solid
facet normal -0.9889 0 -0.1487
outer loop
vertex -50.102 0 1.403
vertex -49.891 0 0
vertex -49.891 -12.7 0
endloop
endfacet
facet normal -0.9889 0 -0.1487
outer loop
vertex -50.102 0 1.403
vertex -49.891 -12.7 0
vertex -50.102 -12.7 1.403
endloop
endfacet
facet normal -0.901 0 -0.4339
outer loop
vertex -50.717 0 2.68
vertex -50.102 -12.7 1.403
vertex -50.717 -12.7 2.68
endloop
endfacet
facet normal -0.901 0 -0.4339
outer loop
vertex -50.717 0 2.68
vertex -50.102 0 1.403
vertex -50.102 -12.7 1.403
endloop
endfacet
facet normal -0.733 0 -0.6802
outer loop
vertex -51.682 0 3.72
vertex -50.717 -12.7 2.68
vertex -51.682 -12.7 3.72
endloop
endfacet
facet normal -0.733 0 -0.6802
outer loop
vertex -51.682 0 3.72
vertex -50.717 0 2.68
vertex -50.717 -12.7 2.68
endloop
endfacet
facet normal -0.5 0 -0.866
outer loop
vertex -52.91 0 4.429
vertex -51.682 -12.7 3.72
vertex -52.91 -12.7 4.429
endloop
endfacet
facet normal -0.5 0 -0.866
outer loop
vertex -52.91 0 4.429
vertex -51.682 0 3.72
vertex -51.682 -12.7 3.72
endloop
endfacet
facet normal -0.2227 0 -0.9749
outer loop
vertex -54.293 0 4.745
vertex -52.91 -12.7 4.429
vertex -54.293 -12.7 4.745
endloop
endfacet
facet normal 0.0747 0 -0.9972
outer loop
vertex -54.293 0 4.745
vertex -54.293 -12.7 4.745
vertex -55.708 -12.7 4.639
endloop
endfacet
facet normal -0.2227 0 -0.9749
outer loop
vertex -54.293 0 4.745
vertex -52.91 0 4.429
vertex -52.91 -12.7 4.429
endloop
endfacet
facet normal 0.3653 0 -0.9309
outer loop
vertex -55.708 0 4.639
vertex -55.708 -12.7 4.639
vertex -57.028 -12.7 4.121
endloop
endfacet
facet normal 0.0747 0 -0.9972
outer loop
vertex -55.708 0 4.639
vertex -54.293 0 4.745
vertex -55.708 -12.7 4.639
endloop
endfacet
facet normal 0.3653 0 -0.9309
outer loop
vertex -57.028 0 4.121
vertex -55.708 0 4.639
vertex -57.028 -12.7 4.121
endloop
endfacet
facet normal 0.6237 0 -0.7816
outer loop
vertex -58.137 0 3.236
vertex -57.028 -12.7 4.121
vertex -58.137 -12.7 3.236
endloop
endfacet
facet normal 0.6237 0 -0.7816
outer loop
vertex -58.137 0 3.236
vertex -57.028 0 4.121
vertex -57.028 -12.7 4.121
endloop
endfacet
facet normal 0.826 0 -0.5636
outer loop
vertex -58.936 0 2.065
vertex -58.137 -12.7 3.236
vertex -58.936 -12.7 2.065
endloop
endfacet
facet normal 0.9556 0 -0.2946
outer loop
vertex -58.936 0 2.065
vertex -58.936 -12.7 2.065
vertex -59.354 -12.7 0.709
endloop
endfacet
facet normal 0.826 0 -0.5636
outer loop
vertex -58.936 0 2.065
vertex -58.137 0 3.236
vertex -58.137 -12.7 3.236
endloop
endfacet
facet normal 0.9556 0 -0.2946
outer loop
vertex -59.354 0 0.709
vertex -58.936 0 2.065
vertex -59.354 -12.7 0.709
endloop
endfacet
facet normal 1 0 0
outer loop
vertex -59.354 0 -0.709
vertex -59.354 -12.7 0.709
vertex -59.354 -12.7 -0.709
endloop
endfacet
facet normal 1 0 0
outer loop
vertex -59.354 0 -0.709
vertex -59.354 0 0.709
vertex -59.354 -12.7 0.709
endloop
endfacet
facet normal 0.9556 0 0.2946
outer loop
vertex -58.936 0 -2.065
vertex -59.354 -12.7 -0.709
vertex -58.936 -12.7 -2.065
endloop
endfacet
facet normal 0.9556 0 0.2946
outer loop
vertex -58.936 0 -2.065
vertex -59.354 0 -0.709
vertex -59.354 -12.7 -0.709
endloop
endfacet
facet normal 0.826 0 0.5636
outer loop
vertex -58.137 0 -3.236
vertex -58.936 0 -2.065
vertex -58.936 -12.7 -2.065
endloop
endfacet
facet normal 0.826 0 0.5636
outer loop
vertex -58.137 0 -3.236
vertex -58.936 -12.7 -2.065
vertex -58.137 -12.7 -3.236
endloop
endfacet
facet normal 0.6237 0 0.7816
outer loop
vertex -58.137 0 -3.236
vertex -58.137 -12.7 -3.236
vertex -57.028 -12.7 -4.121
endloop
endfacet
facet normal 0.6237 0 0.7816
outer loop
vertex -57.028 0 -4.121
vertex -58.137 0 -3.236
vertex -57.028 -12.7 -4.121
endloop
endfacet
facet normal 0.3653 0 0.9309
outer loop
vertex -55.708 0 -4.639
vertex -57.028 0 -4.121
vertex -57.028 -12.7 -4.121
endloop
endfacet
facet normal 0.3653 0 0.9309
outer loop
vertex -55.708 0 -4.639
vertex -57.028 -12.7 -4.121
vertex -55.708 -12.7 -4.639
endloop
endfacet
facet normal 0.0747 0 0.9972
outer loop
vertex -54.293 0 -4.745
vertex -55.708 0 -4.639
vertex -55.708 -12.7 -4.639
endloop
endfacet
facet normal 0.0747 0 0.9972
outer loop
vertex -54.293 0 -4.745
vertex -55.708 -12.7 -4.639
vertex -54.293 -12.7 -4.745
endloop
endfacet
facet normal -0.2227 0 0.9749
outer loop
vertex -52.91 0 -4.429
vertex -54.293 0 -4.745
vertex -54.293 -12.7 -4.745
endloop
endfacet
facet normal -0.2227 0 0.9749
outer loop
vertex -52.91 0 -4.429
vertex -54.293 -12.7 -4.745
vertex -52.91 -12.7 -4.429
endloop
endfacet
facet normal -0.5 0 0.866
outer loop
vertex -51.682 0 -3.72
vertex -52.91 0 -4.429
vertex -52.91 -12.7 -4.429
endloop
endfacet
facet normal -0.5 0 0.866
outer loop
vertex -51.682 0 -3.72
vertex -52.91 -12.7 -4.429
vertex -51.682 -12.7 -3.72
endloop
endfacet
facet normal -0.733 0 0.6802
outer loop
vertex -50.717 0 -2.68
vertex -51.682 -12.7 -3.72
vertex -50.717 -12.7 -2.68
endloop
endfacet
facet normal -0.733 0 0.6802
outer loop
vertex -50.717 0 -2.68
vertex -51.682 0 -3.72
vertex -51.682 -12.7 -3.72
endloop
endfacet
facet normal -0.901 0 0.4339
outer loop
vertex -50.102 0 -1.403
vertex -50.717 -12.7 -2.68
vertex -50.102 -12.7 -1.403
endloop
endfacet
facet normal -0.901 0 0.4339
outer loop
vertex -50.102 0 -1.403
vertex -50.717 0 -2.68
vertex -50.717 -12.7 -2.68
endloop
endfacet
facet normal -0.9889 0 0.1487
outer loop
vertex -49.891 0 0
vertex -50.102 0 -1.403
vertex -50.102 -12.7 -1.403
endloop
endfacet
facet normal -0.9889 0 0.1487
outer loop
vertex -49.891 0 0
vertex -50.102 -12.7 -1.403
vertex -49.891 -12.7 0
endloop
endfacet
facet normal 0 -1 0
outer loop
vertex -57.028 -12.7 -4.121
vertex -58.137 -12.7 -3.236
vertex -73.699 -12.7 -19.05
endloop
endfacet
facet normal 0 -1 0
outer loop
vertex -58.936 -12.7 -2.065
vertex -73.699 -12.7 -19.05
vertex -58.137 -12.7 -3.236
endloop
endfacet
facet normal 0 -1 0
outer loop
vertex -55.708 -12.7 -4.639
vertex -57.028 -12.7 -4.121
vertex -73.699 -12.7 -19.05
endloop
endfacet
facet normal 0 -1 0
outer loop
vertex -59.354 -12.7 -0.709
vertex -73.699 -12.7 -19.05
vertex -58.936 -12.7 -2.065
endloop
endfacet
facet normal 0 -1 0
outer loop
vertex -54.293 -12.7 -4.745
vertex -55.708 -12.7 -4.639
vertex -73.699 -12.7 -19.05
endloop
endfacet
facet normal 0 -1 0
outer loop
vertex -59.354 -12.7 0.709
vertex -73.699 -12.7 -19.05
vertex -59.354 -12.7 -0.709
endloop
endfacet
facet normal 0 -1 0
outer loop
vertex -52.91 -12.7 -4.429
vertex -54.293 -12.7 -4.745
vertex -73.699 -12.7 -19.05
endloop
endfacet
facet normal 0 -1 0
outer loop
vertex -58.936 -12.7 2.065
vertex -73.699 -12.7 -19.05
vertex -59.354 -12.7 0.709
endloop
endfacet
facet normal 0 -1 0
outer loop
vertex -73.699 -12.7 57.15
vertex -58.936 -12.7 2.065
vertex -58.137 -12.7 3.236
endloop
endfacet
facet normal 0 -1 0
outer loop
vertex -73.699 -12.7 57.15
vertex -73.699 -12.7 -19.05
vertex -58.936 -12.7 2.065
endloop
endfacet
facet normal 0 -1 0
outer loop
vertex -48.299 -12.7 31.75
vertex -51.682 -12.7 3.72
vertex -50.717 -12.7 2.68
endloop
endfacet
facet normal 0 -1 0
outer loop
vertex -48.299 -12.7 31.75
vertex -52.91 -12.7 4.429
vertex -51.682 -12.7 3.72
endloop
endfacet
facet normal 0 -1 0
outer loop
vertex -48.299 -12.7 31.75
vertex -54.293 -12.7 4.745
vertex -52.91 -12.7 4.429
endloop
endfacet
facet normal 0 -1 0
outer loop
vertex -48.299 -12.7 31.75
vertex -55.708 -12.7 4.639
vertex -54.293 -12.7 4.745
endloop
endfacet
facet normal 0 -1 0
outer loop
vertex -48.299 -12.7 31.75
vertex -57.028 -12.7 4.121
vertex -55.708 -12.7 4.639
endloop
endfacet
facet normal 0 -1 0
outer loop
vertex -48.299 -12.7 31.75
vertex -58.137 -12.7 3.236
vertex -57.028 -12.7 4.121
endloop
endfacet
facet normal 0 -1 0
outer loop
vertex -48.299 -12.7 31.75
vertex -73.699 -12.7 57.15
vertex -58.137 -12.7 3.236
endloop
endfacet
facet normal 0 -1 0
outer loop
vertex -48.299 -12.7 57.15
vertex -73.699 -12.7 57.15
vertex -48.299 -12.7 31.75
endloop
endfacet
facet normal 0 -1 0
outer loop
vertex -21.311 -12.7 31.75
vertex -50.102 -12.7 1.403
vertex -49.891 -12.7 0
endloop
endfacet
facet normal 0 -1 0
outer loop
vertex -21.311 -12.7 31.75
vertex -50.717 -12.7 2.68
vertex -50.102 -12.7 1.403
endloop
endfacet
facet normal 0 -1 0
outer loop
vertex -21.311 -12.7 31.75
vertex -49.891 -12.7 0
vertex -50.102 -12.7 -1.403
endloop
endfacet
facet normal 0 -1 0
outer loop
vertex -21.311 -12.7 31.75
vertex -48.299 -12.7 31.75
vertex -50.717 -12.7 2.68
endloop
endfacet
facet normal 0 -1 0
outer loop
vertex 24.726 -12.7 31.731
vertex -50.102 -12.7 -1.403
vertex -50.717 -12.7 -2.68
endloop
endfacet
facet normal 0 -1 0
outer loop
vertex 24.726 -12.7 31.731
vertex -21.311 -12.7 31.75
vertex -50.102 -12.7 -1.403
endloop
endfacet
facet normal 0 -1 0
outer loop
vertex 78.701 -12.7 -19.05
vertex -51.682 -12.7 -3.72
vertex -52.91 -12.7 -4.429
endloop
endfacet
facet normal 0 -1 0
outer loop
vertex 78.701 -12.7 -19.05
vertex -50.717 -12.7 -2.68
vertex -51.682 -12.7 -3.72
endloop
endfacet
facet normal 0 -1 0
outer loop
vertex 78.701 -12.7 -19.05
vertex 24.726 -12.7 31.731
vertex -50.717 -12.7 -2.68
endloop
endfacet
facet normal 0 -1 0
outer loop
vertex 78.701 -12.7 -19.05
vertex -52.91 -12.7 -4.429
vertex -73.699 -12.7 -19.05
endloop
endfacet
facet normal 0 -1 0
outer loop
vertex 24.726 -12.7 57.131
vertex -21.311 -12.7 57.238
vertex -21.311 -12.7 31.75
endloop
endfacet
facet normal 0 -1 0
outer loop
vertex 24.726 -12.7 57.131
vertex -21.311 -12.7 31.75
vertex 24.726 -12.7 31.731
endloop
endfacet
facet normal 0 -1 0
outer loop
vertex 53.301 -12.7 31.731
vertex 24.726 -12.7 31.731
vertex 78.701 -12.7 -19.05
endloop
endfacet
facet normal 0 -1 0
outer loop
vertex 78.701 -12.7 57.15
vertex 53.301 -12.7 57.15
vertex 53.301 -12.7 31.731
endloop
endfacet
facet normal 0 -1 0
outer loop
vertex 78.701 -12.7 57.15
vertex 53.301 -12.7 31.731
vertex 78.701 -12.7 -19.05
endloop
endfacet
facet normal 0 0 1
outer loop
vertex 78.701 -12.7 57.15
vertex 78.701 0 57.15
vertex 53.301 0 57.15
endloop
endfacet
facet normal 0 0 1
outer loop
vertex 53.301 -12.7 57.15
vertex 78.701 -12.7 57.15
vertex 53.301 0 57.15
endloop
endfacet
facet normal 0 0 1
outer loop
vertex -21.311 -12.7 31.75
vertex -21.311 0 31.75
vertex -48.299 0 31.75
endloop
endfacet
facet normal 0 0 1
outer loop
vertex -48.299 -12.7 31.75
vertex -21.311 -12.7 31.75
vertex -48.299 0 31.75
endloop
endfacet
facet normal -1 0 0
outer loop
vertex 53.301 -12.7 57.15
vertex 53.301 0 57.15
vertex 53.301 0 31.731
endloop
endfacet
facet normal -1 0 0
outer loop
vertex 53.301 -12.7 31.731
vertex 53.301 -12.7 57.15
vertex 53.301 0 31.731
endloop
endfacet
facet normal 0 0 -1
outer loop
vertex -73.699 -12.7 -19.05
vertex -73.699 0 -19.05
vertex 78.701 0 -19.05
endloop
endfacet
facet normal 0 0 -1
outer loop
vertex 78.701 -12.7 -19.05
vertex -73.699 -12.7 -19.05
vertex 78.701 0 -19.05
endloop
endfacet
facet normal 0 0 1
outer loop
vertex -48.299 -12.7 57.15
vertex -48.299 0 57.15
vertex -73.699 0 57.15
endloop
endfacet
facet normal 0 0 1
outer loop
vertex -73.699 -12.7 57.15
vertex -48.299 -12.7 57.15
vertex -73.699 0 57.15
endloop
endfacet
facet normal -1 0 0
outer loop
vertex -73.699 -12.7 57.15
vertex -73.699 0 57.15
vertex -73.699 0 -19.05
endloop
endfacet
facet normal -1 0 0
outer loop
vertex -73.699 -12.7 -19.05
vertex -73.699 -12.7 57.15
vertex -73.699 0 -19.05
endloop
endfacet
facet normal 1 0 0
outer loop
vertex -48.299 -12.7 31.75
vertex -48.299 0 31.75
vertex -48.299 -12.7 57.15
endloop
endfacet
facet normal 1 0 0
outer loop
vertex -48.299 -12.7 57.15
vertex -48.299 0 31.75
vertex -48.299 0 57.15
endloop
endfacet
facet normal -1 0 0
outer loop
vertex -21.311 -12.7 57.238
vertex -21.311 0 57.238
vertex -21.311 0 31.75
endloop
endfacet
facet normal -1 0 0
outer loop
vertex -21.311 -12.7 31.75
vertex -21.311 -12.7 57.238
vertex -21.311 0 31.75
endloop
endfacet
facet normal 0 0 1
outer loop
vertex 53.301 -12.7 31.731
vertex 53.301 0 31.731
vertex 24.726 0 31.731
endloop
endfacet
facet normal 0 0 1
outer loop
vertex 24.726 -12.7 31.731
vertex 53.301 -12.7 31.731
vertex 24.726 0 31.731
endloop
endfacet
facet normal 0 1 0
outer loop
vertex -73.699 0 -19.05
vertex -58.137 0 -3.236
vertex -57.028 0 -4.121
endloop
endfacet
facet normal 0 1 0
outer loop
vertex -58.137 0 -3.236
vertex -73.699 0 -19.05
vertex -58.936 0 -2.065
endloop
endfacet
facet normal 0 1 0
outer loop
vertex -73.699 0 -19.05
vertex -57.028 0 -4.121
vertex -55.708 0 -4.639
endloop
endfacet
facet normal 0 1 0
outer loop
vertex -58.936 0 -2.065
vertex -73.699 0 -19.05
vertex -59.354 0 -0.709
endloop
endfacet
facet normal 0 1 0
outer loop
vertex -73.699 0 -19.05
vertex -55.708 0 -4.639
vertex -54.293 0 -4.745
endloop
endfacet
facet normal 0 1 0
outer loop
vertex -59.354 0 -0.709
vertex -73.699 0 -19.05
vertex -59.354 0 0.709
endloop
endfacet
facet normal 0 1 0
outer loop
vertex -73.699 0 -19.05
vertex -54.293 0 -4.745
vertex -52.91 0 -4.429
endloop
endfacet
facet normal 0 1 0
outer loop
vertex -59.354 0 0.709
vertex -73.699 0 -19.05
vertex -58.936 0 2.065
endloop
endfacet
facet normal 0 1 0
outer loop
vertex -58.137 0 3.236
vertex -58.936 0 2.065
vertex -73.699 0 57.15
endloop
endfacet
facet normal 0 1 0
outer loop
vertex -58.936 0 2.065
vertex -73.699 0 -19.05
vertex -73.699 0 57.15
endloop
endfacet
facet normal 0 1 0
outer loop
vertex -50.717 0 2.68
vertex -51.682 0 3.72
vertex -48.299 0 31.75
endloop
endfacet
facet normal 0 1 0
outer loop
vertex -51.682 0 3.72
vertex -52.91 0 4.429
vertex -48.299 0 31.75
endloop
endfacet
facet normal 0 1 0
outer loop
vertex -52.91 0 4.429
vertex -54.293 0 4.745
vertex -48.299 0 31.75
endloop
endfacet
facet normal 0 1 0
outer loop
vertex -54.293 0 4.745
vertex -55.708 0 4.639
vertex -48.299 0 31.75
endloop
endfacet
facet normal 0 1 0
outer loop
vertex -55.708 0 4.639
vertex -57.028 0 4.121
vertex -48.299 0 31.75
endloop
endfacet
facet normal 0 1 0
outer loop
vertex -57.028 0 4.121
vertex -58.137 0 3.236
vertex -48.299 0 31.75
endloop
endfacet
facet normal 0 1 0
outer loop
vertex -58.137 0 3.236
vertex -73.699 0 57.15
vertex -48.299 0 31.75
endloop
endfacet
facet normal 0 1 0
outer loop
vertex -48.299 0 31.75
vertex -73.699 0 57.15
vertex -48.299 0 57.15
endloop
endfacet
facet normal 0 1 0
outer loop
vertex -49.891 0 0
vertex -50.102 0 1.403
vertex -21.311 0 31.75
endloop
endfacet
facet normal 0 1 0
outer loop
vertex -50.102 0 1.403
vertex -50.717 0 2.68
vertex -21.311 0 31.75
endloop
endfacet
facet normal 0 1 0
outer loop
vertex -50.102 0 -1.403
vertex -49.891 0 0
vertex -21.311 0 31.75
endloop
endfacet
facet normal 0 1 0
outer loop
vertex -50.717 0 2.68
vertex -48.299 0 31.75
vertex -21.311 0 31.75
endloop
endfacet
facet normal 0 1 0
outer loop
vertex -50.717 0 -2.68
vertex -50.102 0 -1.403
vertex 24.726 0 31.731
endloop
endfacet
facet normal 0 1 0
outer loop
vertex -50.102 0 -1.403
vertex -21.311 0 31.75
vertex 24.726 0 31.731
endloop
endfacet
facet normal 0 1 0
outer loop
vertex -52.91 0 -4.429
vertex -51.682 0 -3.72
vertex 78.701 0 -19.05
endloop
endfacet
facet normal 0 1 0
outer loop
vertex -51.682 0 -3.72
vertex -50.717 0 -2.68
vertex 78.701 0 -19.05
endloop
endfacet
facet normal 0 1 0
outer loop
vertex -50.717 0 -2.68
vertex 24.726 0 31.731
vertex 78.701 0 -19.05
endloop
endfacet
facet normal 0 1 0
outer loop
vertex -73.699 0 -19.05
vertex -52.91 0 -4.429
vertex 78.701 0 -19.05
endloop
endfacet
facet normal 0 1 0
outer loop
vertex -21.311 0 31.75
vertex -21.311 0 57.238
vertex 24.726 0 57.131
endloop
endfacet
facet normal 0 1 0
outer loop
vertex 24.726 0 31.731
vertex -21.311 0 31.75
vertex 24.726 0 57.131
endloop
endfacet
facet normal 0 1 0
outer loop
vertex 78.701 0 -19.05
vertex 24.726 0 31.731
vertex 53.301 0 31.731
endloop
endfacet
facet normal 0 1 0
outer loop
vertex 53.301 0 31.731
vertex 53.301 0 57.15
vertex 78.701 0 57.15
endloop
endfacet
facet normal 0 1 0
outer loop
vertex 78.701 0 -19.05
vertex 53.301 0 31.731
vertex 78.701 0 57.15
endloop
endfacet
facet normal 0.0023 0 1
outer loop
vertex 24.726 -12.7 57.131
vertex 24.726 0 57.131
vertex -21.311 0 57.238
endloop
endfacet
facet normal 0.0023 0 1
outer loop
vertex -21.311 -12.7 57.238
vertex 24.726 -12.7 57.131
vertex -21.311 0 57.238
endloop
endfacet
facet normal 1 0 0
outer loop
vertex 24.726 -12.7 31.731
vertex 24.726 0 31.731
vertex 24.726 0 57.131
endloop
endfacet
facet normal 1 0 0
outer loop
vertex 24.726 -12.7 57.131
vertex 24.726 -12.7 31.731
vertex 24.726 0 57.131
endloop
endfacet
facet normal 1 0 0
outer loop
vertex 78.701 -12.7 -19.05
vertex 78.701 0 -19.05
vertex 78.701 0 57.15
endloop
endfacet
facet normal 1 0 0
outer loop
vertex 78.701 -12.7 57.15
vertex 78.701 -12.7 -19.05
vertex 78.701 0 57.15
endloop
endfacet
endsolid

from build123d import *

# Parameters (mm, degrees)
F0_R     = 4.758249
F1_DEPTH = 12.7


with BuildPart() as f1:
    # F0 (on Front) → F1 (new body)
    with BuildSketch(Plane.XZ):
        Polygon((-48.298843, 57.15), (-73.698843, 57.15), (-73.698843, -19.05), (78.701157, -19.05), (78.701157, 57.15), (53.301157, 57.15), (53.301157, 31.730622), (24.726157, 31.730622), (24.726157, 57.130622), (-21.311343, 57.237761), (-21.311343, 31.75), (-48.298843, 31.75), align=None)
        with Locations((-54.648843, 0)):
            Circle(F0_R, mode=Mode.SUBTRACT)
    extrude(amount=F1_DEPTH)


solid = f1.part
